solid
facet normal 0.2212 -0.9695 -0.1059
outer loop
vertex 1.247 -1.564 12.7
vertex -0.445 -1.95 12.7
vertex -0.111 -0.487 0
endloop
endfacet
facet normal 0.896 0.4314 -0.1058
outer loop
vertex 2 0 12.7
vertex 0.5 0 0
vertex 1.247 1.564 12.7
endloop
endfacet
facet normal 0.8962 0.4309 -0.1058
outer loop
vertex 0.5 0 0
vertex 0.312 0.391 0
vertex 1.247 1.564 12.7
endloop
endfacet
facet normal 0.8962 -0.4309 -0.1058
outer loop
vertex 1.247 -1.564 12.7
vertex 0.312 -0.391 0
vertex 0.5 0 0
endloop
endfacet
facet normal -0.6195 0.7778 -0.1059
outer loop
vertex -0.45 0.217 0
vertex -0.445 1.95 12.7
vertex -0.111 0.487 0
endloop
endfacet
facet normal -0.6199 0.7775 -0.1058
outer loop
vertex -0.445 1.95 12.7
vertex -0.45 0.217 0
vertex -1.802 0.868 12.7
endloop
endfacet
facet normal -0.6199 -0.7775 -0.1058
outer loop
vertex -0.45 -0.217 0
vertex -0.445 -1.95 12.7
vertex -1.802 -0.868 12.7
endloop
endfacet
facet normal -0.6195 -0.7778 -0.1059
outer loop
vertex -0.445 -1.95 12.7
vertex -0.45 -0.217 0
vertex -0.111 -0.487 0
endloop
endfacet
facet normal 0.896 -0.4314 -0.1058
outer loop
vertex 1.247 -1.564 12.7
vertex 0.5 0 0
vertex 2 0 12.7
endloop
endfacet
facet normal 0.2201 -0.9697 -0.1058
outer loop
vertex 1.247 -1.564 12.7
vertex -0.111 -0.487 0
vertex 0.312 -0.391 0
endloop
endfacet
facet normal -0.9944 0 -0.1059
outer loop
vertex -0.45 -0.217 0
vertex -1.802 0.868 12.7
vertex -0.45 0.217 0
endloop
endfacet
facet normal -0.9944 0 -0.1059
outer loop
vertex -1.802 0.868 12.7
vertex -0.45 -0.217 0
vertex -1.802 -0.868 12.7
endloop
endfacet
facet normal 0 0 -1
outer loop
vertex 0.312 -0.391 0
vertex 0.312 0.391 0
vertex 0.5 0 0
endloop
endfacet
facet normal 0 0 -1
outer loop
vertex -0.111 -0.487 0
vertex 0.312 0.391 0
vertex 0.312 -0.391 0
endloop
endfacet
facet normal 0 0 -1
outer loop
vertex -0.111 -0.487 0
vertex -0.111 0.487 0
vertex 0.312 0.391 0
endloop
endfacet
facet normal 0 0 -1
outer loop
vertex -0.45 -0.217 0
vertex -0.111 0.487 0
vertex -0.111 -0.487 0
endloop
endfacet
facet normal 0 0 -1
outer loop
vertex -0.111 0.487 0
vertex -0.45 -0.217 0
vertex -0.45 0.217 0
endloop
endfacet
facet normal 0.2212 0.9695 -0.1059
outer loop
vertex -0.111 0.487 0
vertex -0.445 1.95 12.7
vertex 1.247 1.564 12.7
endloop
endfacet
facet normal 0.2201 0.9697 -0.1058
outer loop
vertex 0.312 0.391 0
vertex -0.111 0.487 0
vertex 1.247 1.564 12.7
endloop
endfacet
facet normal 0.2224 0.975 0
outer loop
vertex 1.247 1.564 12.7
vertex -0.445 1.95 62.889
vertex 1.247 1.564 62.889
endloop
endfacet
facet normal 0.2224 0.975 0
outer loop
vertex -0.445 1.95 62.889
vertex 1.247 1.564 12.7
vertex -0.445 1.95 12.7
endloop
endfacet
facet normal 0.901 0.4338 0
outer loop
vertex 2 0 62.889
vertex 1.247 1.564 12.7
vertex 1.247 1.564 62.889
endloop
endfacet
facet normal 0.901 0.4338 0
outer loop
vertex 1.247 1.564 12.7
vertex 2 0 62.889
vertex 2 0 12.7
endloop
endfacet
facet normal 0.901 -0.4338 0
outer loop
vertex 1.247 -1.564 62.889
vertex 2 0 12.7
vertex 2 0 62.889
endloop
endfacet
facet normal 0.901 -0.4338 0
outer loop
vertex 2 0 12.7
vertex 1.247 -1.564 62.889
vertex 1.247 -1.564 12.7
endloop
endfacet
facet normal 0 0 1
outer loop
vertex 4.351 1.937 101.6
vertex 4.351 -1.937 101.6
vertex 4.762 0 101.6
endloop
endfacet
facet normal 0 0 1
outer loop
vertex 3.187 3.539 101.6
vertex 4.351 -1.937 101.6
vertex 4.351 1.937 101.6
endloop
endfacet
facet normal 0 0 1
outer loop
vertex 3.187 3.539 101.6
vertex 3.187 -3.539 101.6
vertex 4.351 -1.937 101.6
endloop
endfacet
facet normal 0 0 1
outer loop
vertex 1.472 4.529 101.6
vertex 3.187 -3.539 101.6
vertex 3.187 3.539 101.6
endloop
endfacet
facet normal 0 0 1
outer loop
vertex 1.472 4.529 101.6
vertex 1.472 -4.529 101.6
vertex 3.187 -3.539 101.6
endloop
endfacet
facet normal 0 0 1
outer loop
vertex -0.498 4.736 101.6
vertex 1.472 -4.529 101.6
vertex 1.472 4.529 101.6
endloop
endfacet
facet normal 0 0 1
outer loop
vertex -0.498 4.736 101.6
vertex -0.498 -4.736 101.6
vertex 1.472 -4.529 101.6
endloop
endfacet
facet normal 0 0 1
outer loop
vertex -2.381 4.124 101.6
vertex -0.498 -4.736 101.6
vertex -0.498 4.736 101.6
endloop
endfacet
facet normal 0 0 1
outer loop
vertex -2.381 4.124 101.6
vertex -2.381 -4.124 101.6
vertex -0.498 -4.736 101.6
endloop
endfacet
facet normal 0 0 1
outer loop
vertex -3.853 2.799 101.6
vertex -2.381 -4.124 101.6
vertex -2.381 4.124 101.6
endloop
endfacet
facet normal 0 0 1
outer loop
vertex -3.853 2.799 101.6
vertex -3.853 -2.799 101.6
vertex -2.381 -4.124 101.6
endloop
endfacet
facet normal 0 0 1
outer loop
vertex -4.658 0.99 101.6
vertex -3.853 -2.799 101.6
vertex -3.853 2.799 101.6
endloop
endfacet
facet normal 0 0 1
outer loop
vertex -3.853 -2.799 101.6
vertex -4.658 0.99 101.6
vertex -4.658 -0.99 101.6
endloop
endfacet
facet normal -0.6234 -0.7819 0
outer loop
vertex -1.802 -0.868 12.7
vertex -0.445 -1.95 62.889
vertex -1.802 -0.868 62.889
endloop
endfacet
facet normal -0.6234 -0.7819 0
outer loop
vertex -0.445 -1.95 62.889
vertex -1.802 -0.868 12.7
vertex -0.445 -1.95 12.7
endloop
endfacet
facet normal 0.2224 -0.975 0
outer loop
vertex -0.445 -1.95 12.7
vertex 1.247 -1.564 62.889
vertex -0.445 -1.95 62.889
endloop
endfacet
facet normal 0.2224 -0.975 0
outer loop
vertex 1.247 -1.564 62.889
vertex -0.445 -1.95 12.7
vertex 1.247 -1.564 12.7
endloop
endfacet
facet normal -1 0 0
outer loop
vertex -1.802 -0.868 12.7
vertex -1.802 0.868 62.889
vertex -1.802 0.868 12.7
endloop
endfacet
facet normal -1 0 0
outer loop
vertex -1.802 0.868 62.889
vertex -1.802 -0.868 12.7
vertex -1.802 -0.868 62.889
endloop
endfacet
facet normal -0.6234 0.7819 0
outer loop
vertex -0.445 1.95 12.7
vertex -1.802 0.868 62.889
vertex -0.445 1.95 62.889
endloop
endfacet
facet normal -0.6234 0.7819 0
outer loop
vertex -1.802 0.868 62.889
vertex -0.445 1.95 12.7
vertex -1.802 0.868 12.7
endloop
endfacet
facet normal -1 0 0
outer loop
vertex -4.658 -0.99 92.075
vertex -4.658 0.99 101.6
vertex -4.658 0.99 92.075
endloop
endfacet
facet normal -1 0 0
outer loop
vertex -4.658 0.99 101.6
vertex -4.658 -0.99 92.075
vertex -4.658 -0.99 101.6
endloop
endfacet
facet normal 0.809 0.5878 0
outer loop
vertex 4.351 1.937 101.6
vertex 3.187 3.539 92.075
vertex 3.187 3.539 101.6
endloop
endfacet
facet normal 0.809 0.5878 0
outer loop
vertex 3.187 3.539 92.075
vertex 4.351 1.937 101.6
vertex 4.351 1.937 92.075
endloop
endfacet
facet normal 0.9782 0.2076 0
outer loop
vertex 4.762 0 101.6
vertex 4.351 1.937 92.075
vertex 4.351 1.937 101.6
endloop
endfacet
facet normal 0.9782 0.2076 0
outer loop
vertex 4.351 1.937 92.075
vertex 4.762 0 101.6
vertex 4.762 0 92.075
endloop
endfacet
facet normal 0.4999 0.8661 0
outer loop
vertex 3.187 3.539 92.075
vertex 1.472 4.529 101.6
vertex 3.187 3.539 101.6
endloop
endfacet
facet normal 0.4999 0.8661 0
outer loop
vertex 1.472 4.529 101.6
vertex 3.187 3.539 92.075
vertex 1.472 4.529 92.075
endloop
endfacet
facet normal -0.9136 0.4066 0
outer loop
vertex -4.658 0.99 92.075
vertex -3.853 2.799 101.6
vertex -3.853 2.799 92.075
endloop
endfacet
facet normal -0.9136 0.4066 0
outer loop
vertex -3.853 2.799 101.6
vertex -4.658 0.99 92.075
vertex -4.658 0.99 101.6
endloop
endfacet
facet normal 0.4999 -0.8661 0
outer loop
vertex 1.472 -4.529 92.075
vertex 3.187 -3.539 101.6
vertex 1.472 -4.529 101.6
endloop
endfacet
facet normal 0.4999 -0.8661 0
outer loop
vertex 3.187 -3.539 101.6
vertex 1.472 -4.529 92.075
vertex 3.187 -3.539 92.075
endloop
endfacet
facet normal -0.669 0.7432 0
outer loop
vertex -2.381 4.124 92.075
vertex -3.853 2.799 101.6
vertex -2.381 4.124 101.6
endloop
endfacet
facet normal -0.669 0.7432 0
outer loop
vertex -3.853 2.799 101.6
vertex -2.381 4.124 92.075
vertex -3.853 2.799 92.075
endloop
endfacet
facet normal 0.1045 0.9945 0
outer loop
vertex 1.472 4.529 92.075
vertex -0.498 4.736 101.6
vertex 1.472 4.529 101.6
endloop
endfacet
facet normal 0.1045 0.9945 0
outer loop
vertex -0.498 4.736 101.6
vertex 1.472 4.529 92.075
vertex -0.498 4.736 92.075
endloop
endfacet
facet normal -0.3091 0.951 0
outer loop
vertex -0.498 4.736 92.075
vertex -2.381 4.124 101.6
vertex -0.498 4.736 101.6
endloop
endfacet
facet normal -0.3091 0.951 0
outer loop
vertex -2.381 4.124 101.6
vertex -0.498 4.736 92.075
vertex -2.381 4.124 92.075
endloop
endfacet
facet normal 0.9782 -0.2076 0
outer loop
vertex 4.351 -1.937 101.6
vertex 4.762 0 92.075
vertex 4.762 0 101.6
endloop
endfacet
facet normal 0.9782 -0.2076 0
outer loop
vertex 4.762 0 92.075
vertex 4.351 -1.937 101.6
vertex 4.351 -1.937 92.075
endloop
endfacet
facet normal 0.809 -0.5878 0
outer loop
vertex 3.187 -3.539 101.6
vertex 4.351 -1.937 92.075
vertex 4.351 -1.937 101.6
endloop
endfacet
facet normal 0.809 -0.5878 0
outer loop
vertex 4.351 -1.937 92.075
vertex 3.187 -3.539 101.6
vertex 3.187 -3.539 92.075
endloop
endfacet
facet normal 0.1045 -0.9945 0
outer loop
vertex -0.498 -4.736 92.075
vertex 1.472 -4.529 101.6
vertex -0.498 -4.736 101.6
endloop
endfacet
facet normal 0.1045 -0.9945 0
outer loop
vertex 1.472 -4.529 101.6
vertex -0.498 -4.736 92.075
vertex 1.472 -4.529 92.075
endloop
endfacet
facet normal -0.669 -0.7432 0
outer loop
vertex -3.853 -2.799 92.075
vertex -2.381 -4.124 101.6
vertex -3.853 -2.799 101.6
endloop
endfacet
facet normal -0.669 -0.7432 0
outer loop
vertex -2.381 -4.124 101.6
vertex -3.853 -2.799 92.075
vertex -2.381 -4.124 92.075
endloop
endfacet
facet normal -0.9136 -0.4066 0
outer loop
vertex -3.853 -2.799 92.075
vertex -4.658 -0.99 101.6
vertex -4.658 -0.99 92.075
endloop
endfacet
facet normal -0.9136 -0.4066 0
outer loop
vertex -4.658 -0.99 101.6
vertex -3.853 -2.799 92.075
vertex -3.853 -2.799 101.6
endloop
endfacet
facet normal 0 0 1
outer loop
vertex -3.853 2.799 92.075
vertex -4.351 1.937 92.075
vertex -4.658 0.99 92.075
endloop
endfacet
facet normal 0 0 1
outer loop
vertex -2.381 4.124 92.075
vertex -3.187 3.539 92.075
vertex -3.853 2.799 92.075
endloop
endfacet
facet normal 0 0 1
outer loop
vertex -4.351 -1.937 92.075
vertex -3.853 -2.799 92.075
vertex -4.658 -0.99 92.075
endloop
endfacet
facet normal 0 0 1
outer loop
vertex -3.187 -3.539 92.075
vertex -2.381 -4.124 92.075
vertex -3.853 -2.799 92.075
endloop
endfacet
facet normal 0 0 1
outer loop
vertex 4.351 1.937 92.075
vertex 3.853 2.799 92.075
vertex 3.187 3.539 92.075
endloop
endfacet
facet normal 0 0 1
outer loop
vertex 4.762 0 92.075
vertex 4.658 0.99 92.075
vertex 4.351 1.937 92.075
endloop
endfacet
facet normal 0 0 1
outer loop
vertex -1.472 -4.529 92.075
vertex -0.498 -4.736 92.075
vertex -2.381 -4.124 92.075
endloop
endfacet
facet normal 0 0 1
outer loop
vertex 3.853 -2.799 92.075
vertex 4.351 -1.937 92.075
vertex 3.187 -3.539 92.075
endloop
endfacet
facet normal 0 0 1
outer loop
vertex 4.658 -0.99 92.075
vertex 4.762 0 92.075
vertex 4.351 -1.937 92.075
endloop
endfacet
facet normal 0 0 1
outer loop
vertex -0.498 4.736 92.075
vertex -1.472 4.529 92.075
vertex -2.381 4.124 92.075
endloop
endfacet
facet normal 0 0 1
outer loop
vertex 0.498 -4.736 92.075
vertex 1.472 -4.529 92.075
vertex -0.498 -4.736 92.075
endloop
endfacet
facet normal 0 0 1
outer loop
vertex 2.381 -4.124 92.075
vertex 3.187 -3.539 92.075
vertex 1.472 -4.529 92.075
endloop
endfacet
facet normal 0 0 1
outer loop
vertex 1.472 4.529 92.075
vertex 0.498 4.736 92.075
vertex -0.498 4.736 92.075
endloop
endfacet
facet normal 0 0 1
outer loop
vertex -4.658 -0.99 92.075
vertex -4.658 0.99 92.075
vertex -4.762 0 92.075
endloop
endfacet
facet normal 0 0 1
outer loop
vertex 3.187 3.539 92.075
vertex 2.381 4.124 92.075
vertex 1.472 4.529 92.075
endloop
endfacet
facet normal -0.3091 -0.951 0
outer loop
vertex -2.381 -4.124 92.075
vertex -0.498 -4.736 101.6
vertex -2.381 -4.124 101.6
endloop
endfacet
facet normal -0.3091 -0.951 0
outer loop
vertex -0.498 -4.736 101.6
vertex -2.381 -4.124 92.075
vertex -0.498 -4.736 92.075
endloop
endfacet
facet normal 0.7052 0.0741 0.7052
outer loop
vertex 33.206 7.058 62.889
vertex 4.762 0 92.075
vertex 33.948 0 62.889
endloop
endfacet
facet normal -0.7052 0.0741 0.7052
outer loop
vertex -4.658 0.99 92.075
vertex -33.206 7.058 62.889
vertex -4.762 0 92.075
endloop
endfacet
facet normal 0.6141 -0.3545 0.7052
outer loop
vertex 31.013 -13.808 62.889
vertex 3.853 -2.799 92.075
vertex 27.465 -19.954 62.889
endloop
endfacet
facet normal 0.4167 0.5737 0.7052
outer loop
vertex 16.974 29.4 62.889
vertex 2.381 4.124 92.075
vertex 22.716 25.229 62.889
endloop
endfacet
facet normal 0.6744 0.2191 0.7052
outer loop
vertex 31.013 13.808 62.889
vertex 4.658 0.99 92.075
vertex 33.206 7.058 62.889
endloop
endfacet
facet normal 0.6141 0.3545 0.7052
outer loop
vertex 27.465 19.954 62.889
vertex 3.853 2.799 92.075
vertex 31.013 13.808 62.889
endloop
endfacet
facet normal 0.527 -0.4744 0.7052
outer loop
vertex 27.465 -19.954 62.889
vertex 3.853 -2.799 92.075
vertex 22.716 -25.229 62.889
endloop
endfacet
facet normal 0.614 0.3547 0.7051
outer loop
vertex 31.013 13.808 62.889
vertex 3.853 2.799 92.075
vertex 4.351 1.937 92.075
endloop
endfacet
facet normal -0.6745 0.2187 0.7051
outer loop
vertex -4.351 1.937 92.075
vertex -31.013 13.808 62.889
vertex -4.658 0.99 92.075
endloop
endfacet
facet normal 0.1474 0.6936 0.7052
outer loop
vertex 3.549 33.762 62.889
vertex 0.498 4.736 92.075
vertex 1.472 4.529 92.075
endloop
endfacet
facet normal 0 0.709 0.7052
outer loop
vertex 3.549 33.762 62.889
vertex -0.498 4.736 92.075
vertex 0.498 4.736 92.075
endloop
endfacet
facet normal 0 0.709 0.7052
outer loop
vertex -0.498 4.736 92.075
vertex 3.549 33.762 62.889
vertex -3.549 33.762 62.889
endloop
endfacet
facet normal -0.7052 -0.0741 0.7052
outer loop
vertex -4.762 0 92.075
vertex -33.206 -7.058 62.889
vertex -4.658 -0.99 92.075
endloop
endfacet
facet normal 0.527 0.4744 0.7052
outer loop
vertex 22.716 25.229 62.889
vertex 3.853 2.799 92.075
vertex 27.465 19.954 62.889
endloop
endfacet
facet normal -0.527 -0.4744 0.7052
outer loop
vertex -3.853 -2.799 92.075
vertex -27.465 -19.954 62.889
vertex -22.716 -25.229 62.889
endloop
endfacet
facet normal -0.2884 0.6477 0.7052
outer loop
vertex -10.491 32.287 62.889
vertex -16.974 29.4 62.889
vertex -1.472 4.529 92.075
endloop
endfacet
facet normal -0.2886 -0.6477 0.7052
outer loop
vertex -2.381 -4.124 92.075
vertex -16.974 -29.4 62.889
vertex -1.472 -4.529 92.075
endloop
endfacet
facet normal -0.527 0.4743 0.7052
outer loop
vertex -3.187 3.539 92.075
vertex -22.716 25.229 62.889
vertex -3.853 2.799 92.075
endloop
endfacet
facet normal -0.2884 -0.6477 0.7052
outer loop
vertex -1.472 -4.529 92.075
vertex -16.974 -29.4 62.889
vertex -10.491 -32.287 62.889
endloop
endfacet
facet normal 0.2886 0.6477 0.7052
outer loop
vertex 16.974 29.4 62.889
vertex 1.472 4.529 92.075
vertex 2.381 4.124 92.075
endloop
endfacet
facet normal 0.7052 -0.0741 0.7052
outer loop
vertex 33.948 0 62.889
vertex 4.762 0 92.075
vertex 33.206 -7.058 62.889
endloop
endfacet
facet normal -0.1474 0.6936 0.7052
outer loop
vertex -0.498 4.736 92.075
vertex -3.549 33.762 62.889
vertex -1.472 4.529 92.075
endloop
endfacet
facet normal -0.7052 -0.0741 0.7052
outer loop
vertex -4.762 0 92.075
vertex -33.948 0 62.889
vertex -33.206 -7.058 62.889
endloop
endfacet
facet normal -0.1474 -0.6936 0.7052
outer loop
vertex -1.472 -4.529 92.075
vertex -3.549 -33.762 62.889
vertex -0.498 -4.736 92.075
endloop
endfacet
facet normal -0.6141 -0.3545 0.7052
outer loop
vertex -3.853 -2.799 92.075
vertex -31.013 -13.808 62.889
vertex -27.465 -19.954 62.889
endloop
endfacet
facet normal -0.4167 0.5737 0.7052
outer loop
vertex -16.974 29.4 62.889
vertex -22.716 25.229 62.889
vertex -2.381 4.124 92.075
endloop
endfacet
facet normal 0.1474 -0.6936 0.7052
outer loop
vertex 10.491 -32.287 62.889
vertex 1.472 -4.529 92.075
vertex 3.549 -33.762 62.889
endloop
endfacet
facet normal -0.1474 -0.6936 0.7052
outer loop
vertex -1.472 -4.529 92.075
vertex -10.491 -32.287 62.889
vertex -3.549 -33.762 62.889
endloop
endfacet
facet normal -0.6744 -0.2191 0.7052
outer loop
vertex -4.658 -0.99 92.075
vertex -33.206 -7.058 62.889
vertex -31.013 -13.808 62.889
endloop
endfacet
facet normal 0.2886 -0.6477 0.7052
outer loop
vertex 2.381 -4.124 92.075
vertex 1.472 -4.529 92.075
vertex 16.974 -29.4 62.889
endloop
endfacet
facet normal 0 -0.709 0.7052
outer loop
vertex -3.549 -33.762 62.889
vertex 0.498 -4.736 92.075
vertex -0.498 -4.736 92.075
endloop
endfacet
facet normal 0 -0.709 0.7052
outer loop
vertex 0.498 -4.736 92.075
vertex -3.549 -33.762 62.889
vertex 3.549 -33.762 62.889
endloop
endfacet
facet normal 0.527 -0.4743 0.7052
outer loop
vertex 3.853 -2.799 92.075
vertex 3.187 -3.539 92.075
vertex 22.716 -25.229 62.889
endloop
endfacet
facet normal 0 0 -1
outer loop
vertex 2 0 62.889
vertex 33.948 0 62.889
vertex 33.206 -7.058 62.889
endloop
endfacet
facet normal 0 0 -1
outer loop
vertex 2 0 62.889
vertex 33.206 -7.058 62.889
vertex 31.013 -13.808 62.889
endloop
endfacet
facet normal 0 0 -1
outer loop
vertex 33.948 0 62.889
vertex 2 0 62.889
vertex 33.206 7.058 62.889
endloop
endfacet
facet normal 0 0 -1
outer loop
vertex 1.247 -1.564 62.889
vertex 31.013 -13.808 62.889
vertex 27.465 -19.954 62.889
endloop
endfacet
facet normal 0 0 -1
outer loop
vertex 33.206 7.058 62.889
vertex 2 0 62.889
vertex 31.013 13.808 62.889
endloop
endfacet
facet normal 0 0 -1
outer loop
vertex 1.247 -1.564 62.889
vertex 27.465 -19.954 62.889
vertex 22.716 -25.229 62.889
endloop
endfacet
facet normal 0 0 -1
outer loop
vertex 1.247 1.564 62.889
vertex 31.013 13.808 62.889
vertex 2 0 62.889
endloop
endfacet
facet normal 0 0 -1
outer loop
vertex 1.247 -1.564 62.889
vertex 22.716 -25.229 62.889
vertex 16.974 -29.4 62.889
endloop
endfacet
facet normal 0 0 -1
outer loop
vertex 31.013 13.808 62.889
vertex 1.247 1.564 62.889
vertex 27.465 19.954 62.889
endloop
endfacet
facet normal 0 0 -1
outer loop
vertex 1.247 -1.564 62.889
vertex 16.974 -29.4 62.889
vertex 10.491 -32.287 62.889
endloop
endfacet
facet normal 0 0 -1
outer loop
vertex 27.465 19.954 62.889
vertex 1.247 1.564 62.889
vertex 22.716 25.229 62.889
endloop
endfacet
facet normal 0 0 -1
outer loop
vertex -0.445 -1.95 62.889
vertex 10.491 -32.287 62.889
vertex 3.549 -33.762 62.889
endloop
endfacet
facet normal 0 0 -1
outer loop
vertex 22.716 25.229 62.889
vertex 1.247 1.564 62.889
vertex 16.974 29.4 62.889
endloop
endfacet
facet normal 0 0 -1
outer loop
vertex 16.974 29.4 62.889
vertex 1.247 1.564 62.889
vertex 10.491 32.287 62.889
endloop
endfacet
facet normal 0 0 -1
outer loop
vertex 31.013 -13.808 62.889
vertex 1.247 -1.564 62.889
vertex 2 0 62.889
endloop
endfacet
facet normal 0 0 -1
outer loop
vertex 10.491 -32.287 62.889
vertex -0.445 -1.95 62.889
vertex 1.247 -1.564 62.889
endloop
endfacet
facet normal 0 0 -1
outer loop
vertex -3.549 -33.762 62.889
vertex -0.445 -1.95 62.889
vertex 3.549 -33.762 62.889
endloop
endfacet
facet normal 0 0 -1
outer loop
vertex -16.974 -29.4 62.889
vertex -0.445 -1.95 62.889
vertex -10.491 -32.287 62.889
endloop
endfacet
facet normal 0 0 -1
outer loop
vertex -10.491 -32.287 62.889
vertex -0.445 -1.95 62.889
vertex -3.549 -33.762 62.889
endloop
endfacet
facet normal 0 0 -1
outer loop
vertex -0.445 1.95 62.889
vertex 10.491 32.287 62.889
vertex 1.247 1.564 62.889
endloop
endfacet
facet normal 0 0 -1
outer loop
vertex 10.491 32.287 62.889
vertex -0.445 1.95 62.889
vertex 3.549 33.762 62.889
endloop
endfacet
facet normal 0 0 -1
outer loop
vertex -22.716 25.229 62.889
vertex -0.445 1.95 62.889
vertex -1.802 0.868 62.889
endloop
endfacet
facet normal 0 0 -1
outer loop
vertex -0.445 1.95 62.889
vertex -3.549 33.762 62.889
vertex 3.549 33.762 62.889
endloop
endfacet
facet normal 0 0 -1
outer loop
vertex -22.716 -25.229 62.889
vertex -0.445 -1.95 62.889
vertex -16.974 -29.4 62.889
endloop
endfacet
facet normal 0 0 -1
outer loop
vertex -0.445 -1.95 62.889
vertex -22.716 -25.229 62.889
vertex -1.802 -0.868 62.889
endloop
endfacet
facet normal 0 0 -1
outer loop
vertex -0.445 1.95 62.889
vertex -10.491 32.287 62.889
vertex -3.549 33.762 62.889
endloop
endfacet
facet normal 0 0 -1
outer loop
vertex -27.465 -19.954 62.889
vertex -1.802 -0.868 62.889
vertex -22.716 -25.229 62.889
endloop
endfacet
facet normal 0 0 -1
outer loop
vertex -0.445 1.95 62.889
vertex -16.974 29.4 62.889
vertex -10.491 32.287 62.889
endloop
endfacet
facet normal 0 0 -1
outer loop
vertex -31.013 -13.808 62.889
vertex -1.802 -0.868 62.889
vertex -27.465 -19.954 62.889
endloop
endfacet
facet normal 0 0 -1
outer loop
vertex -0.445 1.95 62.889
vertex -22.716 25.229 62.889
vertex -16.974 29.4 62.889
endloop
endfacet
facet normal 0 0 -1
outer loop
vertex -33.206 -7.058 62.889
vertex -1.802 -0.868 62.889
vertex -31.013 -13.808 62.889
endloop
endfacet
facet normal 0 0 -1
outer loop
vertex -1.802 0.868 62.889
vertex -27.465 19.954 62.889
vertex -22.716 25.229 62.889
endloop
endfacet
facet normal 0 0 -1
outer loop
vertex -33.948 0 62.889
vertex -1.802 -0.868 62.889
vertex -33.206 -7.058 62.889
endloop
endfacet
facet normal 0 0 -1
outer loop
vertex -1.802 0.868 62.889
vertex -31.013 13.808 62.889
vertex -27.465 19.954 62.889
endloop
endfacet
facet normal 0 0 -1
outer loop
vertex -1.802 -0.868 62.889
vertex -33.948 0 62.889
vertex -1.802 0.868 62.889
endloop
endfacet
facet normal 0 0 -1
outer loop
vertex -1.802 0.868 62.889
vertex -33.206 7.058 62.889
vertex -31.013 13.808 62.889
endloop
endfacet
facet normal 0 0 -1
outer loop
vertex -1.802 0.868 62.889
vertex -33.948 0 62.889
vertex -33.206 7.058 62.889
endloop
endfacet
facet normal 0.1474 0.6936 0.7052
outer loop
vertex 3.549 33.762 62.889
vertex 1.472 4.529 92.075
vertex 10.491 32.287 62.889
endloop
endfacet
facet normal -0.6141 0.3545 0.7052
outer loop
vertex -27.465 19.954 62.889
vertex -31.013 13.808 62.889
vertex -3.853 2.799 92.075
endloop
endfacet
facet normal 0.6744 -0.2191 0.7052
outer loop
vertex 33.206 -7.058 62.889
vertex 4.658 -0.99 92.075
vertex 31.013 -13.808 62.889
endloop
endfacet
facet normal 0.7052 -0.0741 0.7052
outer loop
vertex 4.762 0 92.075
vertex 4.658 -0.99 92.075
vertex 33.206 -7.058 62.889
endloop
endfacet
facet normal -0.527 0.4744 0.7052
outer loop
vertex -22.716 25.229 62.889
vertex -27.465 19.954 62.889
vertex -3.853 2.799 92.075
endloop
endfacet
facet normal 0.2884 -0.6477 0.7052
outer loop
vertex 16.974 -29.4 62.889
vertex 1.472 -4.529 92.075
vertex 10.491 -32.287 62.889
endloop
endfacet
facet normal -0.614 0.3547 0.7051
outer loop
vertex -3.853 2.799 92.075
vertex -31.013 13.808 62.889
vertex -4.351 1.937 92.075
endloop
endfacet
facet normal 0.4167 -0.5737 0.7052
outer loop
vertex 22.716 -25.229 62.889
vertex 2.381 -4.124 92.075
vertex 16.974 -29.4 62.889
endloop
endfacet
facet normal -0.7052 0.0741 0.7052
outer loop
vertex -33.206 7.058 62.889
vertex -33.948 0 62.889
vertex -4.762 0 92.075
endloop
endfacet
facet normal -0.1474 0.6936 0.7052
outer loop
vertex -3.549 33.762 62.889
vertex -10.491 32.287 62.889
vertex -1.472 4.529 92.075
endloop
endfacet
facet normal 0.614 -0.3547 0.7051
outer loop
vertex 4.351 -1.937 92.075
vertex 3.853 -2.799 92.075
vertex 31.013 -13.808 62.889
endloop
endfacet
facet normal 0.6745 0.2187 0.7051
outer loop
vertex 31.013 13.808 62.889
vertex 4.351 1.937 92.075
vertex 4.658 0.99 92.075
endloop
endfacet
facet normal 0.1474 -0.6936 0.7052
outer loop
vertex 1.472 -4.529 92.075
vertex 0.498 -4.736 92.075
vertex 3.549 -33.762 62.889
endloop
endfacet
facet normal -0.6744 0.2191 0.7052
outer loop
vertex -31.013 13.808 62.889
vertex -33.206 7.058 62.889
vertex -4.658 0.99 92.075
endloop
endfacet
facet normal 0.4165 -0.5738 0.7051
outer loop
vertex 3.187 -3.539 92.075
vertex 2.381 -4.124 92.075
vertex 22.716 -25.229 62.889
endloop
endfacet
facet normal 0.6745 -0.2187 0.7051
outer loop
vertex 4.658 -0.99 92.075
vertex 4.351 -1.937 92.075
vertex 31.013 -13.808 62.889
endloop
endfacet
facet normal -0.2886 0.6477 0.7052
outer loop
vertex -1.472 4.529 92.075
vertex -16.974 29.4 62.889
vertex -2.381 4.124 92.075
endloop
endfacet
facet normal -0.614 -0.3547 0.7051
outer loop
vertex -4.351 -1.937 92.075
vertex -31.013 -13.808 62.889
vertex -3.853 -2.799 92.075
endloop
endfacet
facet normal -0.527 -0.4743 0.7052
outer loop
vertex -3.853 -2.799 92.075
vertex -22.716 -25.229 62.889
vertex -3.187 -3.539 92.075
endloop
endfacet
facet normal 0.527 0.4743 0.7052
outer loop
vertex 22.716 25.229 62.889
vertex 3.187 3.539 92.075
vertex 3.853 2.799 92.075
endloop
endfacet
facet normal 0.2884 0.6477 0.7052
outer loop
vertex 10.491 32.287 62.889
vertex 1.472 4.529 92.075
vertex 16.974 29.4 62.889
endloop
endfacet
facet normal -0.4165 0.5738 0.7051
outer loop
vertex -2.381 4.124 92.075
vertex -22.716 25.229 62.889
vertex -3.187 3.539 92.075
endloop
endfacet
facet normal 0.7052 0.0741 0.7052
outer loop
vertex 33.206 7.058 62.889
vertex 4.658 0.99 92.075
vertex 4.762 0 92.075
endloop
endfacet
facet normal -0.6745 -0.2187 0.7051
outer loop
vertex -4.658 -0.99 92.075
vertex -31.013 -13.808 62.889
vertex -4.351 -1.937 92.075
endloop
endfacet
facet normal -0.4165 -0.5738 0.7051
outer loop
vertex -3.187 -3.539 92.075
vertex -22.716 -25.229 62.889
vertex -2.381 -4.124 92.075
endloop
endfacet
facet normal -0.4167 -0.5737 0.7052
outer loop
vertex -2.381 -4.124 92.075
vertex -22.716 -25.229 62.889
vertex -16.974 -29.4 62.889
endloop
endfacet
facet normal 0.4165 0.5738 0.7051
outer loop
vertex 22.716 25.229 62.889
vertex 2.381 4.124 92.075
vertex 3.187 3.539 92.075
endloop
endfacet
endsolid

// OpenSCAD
/**
 * Copyright 2018 Nathan Fairhurst.
 */

module umbrella(open_angle) {
  umbrella_length = 41.275;
  expansion = sin(open_angle) * umbrella_length;
  downward = cos(open_angle) * umbrella_length;

  cylinder(12.7, 0.5, 2);
  translate([0, 0, 12.7])
    cylinder(88.9, 2, 2);
  translate([0, 0, 92.075])
    cylinder(9.525, 4.7625, 4.7625);
  translate([0, 0, 92.075 - downward])
    cylinder(downward, expansion + 4.7625, 4.7625);
}

umbrella(45);
